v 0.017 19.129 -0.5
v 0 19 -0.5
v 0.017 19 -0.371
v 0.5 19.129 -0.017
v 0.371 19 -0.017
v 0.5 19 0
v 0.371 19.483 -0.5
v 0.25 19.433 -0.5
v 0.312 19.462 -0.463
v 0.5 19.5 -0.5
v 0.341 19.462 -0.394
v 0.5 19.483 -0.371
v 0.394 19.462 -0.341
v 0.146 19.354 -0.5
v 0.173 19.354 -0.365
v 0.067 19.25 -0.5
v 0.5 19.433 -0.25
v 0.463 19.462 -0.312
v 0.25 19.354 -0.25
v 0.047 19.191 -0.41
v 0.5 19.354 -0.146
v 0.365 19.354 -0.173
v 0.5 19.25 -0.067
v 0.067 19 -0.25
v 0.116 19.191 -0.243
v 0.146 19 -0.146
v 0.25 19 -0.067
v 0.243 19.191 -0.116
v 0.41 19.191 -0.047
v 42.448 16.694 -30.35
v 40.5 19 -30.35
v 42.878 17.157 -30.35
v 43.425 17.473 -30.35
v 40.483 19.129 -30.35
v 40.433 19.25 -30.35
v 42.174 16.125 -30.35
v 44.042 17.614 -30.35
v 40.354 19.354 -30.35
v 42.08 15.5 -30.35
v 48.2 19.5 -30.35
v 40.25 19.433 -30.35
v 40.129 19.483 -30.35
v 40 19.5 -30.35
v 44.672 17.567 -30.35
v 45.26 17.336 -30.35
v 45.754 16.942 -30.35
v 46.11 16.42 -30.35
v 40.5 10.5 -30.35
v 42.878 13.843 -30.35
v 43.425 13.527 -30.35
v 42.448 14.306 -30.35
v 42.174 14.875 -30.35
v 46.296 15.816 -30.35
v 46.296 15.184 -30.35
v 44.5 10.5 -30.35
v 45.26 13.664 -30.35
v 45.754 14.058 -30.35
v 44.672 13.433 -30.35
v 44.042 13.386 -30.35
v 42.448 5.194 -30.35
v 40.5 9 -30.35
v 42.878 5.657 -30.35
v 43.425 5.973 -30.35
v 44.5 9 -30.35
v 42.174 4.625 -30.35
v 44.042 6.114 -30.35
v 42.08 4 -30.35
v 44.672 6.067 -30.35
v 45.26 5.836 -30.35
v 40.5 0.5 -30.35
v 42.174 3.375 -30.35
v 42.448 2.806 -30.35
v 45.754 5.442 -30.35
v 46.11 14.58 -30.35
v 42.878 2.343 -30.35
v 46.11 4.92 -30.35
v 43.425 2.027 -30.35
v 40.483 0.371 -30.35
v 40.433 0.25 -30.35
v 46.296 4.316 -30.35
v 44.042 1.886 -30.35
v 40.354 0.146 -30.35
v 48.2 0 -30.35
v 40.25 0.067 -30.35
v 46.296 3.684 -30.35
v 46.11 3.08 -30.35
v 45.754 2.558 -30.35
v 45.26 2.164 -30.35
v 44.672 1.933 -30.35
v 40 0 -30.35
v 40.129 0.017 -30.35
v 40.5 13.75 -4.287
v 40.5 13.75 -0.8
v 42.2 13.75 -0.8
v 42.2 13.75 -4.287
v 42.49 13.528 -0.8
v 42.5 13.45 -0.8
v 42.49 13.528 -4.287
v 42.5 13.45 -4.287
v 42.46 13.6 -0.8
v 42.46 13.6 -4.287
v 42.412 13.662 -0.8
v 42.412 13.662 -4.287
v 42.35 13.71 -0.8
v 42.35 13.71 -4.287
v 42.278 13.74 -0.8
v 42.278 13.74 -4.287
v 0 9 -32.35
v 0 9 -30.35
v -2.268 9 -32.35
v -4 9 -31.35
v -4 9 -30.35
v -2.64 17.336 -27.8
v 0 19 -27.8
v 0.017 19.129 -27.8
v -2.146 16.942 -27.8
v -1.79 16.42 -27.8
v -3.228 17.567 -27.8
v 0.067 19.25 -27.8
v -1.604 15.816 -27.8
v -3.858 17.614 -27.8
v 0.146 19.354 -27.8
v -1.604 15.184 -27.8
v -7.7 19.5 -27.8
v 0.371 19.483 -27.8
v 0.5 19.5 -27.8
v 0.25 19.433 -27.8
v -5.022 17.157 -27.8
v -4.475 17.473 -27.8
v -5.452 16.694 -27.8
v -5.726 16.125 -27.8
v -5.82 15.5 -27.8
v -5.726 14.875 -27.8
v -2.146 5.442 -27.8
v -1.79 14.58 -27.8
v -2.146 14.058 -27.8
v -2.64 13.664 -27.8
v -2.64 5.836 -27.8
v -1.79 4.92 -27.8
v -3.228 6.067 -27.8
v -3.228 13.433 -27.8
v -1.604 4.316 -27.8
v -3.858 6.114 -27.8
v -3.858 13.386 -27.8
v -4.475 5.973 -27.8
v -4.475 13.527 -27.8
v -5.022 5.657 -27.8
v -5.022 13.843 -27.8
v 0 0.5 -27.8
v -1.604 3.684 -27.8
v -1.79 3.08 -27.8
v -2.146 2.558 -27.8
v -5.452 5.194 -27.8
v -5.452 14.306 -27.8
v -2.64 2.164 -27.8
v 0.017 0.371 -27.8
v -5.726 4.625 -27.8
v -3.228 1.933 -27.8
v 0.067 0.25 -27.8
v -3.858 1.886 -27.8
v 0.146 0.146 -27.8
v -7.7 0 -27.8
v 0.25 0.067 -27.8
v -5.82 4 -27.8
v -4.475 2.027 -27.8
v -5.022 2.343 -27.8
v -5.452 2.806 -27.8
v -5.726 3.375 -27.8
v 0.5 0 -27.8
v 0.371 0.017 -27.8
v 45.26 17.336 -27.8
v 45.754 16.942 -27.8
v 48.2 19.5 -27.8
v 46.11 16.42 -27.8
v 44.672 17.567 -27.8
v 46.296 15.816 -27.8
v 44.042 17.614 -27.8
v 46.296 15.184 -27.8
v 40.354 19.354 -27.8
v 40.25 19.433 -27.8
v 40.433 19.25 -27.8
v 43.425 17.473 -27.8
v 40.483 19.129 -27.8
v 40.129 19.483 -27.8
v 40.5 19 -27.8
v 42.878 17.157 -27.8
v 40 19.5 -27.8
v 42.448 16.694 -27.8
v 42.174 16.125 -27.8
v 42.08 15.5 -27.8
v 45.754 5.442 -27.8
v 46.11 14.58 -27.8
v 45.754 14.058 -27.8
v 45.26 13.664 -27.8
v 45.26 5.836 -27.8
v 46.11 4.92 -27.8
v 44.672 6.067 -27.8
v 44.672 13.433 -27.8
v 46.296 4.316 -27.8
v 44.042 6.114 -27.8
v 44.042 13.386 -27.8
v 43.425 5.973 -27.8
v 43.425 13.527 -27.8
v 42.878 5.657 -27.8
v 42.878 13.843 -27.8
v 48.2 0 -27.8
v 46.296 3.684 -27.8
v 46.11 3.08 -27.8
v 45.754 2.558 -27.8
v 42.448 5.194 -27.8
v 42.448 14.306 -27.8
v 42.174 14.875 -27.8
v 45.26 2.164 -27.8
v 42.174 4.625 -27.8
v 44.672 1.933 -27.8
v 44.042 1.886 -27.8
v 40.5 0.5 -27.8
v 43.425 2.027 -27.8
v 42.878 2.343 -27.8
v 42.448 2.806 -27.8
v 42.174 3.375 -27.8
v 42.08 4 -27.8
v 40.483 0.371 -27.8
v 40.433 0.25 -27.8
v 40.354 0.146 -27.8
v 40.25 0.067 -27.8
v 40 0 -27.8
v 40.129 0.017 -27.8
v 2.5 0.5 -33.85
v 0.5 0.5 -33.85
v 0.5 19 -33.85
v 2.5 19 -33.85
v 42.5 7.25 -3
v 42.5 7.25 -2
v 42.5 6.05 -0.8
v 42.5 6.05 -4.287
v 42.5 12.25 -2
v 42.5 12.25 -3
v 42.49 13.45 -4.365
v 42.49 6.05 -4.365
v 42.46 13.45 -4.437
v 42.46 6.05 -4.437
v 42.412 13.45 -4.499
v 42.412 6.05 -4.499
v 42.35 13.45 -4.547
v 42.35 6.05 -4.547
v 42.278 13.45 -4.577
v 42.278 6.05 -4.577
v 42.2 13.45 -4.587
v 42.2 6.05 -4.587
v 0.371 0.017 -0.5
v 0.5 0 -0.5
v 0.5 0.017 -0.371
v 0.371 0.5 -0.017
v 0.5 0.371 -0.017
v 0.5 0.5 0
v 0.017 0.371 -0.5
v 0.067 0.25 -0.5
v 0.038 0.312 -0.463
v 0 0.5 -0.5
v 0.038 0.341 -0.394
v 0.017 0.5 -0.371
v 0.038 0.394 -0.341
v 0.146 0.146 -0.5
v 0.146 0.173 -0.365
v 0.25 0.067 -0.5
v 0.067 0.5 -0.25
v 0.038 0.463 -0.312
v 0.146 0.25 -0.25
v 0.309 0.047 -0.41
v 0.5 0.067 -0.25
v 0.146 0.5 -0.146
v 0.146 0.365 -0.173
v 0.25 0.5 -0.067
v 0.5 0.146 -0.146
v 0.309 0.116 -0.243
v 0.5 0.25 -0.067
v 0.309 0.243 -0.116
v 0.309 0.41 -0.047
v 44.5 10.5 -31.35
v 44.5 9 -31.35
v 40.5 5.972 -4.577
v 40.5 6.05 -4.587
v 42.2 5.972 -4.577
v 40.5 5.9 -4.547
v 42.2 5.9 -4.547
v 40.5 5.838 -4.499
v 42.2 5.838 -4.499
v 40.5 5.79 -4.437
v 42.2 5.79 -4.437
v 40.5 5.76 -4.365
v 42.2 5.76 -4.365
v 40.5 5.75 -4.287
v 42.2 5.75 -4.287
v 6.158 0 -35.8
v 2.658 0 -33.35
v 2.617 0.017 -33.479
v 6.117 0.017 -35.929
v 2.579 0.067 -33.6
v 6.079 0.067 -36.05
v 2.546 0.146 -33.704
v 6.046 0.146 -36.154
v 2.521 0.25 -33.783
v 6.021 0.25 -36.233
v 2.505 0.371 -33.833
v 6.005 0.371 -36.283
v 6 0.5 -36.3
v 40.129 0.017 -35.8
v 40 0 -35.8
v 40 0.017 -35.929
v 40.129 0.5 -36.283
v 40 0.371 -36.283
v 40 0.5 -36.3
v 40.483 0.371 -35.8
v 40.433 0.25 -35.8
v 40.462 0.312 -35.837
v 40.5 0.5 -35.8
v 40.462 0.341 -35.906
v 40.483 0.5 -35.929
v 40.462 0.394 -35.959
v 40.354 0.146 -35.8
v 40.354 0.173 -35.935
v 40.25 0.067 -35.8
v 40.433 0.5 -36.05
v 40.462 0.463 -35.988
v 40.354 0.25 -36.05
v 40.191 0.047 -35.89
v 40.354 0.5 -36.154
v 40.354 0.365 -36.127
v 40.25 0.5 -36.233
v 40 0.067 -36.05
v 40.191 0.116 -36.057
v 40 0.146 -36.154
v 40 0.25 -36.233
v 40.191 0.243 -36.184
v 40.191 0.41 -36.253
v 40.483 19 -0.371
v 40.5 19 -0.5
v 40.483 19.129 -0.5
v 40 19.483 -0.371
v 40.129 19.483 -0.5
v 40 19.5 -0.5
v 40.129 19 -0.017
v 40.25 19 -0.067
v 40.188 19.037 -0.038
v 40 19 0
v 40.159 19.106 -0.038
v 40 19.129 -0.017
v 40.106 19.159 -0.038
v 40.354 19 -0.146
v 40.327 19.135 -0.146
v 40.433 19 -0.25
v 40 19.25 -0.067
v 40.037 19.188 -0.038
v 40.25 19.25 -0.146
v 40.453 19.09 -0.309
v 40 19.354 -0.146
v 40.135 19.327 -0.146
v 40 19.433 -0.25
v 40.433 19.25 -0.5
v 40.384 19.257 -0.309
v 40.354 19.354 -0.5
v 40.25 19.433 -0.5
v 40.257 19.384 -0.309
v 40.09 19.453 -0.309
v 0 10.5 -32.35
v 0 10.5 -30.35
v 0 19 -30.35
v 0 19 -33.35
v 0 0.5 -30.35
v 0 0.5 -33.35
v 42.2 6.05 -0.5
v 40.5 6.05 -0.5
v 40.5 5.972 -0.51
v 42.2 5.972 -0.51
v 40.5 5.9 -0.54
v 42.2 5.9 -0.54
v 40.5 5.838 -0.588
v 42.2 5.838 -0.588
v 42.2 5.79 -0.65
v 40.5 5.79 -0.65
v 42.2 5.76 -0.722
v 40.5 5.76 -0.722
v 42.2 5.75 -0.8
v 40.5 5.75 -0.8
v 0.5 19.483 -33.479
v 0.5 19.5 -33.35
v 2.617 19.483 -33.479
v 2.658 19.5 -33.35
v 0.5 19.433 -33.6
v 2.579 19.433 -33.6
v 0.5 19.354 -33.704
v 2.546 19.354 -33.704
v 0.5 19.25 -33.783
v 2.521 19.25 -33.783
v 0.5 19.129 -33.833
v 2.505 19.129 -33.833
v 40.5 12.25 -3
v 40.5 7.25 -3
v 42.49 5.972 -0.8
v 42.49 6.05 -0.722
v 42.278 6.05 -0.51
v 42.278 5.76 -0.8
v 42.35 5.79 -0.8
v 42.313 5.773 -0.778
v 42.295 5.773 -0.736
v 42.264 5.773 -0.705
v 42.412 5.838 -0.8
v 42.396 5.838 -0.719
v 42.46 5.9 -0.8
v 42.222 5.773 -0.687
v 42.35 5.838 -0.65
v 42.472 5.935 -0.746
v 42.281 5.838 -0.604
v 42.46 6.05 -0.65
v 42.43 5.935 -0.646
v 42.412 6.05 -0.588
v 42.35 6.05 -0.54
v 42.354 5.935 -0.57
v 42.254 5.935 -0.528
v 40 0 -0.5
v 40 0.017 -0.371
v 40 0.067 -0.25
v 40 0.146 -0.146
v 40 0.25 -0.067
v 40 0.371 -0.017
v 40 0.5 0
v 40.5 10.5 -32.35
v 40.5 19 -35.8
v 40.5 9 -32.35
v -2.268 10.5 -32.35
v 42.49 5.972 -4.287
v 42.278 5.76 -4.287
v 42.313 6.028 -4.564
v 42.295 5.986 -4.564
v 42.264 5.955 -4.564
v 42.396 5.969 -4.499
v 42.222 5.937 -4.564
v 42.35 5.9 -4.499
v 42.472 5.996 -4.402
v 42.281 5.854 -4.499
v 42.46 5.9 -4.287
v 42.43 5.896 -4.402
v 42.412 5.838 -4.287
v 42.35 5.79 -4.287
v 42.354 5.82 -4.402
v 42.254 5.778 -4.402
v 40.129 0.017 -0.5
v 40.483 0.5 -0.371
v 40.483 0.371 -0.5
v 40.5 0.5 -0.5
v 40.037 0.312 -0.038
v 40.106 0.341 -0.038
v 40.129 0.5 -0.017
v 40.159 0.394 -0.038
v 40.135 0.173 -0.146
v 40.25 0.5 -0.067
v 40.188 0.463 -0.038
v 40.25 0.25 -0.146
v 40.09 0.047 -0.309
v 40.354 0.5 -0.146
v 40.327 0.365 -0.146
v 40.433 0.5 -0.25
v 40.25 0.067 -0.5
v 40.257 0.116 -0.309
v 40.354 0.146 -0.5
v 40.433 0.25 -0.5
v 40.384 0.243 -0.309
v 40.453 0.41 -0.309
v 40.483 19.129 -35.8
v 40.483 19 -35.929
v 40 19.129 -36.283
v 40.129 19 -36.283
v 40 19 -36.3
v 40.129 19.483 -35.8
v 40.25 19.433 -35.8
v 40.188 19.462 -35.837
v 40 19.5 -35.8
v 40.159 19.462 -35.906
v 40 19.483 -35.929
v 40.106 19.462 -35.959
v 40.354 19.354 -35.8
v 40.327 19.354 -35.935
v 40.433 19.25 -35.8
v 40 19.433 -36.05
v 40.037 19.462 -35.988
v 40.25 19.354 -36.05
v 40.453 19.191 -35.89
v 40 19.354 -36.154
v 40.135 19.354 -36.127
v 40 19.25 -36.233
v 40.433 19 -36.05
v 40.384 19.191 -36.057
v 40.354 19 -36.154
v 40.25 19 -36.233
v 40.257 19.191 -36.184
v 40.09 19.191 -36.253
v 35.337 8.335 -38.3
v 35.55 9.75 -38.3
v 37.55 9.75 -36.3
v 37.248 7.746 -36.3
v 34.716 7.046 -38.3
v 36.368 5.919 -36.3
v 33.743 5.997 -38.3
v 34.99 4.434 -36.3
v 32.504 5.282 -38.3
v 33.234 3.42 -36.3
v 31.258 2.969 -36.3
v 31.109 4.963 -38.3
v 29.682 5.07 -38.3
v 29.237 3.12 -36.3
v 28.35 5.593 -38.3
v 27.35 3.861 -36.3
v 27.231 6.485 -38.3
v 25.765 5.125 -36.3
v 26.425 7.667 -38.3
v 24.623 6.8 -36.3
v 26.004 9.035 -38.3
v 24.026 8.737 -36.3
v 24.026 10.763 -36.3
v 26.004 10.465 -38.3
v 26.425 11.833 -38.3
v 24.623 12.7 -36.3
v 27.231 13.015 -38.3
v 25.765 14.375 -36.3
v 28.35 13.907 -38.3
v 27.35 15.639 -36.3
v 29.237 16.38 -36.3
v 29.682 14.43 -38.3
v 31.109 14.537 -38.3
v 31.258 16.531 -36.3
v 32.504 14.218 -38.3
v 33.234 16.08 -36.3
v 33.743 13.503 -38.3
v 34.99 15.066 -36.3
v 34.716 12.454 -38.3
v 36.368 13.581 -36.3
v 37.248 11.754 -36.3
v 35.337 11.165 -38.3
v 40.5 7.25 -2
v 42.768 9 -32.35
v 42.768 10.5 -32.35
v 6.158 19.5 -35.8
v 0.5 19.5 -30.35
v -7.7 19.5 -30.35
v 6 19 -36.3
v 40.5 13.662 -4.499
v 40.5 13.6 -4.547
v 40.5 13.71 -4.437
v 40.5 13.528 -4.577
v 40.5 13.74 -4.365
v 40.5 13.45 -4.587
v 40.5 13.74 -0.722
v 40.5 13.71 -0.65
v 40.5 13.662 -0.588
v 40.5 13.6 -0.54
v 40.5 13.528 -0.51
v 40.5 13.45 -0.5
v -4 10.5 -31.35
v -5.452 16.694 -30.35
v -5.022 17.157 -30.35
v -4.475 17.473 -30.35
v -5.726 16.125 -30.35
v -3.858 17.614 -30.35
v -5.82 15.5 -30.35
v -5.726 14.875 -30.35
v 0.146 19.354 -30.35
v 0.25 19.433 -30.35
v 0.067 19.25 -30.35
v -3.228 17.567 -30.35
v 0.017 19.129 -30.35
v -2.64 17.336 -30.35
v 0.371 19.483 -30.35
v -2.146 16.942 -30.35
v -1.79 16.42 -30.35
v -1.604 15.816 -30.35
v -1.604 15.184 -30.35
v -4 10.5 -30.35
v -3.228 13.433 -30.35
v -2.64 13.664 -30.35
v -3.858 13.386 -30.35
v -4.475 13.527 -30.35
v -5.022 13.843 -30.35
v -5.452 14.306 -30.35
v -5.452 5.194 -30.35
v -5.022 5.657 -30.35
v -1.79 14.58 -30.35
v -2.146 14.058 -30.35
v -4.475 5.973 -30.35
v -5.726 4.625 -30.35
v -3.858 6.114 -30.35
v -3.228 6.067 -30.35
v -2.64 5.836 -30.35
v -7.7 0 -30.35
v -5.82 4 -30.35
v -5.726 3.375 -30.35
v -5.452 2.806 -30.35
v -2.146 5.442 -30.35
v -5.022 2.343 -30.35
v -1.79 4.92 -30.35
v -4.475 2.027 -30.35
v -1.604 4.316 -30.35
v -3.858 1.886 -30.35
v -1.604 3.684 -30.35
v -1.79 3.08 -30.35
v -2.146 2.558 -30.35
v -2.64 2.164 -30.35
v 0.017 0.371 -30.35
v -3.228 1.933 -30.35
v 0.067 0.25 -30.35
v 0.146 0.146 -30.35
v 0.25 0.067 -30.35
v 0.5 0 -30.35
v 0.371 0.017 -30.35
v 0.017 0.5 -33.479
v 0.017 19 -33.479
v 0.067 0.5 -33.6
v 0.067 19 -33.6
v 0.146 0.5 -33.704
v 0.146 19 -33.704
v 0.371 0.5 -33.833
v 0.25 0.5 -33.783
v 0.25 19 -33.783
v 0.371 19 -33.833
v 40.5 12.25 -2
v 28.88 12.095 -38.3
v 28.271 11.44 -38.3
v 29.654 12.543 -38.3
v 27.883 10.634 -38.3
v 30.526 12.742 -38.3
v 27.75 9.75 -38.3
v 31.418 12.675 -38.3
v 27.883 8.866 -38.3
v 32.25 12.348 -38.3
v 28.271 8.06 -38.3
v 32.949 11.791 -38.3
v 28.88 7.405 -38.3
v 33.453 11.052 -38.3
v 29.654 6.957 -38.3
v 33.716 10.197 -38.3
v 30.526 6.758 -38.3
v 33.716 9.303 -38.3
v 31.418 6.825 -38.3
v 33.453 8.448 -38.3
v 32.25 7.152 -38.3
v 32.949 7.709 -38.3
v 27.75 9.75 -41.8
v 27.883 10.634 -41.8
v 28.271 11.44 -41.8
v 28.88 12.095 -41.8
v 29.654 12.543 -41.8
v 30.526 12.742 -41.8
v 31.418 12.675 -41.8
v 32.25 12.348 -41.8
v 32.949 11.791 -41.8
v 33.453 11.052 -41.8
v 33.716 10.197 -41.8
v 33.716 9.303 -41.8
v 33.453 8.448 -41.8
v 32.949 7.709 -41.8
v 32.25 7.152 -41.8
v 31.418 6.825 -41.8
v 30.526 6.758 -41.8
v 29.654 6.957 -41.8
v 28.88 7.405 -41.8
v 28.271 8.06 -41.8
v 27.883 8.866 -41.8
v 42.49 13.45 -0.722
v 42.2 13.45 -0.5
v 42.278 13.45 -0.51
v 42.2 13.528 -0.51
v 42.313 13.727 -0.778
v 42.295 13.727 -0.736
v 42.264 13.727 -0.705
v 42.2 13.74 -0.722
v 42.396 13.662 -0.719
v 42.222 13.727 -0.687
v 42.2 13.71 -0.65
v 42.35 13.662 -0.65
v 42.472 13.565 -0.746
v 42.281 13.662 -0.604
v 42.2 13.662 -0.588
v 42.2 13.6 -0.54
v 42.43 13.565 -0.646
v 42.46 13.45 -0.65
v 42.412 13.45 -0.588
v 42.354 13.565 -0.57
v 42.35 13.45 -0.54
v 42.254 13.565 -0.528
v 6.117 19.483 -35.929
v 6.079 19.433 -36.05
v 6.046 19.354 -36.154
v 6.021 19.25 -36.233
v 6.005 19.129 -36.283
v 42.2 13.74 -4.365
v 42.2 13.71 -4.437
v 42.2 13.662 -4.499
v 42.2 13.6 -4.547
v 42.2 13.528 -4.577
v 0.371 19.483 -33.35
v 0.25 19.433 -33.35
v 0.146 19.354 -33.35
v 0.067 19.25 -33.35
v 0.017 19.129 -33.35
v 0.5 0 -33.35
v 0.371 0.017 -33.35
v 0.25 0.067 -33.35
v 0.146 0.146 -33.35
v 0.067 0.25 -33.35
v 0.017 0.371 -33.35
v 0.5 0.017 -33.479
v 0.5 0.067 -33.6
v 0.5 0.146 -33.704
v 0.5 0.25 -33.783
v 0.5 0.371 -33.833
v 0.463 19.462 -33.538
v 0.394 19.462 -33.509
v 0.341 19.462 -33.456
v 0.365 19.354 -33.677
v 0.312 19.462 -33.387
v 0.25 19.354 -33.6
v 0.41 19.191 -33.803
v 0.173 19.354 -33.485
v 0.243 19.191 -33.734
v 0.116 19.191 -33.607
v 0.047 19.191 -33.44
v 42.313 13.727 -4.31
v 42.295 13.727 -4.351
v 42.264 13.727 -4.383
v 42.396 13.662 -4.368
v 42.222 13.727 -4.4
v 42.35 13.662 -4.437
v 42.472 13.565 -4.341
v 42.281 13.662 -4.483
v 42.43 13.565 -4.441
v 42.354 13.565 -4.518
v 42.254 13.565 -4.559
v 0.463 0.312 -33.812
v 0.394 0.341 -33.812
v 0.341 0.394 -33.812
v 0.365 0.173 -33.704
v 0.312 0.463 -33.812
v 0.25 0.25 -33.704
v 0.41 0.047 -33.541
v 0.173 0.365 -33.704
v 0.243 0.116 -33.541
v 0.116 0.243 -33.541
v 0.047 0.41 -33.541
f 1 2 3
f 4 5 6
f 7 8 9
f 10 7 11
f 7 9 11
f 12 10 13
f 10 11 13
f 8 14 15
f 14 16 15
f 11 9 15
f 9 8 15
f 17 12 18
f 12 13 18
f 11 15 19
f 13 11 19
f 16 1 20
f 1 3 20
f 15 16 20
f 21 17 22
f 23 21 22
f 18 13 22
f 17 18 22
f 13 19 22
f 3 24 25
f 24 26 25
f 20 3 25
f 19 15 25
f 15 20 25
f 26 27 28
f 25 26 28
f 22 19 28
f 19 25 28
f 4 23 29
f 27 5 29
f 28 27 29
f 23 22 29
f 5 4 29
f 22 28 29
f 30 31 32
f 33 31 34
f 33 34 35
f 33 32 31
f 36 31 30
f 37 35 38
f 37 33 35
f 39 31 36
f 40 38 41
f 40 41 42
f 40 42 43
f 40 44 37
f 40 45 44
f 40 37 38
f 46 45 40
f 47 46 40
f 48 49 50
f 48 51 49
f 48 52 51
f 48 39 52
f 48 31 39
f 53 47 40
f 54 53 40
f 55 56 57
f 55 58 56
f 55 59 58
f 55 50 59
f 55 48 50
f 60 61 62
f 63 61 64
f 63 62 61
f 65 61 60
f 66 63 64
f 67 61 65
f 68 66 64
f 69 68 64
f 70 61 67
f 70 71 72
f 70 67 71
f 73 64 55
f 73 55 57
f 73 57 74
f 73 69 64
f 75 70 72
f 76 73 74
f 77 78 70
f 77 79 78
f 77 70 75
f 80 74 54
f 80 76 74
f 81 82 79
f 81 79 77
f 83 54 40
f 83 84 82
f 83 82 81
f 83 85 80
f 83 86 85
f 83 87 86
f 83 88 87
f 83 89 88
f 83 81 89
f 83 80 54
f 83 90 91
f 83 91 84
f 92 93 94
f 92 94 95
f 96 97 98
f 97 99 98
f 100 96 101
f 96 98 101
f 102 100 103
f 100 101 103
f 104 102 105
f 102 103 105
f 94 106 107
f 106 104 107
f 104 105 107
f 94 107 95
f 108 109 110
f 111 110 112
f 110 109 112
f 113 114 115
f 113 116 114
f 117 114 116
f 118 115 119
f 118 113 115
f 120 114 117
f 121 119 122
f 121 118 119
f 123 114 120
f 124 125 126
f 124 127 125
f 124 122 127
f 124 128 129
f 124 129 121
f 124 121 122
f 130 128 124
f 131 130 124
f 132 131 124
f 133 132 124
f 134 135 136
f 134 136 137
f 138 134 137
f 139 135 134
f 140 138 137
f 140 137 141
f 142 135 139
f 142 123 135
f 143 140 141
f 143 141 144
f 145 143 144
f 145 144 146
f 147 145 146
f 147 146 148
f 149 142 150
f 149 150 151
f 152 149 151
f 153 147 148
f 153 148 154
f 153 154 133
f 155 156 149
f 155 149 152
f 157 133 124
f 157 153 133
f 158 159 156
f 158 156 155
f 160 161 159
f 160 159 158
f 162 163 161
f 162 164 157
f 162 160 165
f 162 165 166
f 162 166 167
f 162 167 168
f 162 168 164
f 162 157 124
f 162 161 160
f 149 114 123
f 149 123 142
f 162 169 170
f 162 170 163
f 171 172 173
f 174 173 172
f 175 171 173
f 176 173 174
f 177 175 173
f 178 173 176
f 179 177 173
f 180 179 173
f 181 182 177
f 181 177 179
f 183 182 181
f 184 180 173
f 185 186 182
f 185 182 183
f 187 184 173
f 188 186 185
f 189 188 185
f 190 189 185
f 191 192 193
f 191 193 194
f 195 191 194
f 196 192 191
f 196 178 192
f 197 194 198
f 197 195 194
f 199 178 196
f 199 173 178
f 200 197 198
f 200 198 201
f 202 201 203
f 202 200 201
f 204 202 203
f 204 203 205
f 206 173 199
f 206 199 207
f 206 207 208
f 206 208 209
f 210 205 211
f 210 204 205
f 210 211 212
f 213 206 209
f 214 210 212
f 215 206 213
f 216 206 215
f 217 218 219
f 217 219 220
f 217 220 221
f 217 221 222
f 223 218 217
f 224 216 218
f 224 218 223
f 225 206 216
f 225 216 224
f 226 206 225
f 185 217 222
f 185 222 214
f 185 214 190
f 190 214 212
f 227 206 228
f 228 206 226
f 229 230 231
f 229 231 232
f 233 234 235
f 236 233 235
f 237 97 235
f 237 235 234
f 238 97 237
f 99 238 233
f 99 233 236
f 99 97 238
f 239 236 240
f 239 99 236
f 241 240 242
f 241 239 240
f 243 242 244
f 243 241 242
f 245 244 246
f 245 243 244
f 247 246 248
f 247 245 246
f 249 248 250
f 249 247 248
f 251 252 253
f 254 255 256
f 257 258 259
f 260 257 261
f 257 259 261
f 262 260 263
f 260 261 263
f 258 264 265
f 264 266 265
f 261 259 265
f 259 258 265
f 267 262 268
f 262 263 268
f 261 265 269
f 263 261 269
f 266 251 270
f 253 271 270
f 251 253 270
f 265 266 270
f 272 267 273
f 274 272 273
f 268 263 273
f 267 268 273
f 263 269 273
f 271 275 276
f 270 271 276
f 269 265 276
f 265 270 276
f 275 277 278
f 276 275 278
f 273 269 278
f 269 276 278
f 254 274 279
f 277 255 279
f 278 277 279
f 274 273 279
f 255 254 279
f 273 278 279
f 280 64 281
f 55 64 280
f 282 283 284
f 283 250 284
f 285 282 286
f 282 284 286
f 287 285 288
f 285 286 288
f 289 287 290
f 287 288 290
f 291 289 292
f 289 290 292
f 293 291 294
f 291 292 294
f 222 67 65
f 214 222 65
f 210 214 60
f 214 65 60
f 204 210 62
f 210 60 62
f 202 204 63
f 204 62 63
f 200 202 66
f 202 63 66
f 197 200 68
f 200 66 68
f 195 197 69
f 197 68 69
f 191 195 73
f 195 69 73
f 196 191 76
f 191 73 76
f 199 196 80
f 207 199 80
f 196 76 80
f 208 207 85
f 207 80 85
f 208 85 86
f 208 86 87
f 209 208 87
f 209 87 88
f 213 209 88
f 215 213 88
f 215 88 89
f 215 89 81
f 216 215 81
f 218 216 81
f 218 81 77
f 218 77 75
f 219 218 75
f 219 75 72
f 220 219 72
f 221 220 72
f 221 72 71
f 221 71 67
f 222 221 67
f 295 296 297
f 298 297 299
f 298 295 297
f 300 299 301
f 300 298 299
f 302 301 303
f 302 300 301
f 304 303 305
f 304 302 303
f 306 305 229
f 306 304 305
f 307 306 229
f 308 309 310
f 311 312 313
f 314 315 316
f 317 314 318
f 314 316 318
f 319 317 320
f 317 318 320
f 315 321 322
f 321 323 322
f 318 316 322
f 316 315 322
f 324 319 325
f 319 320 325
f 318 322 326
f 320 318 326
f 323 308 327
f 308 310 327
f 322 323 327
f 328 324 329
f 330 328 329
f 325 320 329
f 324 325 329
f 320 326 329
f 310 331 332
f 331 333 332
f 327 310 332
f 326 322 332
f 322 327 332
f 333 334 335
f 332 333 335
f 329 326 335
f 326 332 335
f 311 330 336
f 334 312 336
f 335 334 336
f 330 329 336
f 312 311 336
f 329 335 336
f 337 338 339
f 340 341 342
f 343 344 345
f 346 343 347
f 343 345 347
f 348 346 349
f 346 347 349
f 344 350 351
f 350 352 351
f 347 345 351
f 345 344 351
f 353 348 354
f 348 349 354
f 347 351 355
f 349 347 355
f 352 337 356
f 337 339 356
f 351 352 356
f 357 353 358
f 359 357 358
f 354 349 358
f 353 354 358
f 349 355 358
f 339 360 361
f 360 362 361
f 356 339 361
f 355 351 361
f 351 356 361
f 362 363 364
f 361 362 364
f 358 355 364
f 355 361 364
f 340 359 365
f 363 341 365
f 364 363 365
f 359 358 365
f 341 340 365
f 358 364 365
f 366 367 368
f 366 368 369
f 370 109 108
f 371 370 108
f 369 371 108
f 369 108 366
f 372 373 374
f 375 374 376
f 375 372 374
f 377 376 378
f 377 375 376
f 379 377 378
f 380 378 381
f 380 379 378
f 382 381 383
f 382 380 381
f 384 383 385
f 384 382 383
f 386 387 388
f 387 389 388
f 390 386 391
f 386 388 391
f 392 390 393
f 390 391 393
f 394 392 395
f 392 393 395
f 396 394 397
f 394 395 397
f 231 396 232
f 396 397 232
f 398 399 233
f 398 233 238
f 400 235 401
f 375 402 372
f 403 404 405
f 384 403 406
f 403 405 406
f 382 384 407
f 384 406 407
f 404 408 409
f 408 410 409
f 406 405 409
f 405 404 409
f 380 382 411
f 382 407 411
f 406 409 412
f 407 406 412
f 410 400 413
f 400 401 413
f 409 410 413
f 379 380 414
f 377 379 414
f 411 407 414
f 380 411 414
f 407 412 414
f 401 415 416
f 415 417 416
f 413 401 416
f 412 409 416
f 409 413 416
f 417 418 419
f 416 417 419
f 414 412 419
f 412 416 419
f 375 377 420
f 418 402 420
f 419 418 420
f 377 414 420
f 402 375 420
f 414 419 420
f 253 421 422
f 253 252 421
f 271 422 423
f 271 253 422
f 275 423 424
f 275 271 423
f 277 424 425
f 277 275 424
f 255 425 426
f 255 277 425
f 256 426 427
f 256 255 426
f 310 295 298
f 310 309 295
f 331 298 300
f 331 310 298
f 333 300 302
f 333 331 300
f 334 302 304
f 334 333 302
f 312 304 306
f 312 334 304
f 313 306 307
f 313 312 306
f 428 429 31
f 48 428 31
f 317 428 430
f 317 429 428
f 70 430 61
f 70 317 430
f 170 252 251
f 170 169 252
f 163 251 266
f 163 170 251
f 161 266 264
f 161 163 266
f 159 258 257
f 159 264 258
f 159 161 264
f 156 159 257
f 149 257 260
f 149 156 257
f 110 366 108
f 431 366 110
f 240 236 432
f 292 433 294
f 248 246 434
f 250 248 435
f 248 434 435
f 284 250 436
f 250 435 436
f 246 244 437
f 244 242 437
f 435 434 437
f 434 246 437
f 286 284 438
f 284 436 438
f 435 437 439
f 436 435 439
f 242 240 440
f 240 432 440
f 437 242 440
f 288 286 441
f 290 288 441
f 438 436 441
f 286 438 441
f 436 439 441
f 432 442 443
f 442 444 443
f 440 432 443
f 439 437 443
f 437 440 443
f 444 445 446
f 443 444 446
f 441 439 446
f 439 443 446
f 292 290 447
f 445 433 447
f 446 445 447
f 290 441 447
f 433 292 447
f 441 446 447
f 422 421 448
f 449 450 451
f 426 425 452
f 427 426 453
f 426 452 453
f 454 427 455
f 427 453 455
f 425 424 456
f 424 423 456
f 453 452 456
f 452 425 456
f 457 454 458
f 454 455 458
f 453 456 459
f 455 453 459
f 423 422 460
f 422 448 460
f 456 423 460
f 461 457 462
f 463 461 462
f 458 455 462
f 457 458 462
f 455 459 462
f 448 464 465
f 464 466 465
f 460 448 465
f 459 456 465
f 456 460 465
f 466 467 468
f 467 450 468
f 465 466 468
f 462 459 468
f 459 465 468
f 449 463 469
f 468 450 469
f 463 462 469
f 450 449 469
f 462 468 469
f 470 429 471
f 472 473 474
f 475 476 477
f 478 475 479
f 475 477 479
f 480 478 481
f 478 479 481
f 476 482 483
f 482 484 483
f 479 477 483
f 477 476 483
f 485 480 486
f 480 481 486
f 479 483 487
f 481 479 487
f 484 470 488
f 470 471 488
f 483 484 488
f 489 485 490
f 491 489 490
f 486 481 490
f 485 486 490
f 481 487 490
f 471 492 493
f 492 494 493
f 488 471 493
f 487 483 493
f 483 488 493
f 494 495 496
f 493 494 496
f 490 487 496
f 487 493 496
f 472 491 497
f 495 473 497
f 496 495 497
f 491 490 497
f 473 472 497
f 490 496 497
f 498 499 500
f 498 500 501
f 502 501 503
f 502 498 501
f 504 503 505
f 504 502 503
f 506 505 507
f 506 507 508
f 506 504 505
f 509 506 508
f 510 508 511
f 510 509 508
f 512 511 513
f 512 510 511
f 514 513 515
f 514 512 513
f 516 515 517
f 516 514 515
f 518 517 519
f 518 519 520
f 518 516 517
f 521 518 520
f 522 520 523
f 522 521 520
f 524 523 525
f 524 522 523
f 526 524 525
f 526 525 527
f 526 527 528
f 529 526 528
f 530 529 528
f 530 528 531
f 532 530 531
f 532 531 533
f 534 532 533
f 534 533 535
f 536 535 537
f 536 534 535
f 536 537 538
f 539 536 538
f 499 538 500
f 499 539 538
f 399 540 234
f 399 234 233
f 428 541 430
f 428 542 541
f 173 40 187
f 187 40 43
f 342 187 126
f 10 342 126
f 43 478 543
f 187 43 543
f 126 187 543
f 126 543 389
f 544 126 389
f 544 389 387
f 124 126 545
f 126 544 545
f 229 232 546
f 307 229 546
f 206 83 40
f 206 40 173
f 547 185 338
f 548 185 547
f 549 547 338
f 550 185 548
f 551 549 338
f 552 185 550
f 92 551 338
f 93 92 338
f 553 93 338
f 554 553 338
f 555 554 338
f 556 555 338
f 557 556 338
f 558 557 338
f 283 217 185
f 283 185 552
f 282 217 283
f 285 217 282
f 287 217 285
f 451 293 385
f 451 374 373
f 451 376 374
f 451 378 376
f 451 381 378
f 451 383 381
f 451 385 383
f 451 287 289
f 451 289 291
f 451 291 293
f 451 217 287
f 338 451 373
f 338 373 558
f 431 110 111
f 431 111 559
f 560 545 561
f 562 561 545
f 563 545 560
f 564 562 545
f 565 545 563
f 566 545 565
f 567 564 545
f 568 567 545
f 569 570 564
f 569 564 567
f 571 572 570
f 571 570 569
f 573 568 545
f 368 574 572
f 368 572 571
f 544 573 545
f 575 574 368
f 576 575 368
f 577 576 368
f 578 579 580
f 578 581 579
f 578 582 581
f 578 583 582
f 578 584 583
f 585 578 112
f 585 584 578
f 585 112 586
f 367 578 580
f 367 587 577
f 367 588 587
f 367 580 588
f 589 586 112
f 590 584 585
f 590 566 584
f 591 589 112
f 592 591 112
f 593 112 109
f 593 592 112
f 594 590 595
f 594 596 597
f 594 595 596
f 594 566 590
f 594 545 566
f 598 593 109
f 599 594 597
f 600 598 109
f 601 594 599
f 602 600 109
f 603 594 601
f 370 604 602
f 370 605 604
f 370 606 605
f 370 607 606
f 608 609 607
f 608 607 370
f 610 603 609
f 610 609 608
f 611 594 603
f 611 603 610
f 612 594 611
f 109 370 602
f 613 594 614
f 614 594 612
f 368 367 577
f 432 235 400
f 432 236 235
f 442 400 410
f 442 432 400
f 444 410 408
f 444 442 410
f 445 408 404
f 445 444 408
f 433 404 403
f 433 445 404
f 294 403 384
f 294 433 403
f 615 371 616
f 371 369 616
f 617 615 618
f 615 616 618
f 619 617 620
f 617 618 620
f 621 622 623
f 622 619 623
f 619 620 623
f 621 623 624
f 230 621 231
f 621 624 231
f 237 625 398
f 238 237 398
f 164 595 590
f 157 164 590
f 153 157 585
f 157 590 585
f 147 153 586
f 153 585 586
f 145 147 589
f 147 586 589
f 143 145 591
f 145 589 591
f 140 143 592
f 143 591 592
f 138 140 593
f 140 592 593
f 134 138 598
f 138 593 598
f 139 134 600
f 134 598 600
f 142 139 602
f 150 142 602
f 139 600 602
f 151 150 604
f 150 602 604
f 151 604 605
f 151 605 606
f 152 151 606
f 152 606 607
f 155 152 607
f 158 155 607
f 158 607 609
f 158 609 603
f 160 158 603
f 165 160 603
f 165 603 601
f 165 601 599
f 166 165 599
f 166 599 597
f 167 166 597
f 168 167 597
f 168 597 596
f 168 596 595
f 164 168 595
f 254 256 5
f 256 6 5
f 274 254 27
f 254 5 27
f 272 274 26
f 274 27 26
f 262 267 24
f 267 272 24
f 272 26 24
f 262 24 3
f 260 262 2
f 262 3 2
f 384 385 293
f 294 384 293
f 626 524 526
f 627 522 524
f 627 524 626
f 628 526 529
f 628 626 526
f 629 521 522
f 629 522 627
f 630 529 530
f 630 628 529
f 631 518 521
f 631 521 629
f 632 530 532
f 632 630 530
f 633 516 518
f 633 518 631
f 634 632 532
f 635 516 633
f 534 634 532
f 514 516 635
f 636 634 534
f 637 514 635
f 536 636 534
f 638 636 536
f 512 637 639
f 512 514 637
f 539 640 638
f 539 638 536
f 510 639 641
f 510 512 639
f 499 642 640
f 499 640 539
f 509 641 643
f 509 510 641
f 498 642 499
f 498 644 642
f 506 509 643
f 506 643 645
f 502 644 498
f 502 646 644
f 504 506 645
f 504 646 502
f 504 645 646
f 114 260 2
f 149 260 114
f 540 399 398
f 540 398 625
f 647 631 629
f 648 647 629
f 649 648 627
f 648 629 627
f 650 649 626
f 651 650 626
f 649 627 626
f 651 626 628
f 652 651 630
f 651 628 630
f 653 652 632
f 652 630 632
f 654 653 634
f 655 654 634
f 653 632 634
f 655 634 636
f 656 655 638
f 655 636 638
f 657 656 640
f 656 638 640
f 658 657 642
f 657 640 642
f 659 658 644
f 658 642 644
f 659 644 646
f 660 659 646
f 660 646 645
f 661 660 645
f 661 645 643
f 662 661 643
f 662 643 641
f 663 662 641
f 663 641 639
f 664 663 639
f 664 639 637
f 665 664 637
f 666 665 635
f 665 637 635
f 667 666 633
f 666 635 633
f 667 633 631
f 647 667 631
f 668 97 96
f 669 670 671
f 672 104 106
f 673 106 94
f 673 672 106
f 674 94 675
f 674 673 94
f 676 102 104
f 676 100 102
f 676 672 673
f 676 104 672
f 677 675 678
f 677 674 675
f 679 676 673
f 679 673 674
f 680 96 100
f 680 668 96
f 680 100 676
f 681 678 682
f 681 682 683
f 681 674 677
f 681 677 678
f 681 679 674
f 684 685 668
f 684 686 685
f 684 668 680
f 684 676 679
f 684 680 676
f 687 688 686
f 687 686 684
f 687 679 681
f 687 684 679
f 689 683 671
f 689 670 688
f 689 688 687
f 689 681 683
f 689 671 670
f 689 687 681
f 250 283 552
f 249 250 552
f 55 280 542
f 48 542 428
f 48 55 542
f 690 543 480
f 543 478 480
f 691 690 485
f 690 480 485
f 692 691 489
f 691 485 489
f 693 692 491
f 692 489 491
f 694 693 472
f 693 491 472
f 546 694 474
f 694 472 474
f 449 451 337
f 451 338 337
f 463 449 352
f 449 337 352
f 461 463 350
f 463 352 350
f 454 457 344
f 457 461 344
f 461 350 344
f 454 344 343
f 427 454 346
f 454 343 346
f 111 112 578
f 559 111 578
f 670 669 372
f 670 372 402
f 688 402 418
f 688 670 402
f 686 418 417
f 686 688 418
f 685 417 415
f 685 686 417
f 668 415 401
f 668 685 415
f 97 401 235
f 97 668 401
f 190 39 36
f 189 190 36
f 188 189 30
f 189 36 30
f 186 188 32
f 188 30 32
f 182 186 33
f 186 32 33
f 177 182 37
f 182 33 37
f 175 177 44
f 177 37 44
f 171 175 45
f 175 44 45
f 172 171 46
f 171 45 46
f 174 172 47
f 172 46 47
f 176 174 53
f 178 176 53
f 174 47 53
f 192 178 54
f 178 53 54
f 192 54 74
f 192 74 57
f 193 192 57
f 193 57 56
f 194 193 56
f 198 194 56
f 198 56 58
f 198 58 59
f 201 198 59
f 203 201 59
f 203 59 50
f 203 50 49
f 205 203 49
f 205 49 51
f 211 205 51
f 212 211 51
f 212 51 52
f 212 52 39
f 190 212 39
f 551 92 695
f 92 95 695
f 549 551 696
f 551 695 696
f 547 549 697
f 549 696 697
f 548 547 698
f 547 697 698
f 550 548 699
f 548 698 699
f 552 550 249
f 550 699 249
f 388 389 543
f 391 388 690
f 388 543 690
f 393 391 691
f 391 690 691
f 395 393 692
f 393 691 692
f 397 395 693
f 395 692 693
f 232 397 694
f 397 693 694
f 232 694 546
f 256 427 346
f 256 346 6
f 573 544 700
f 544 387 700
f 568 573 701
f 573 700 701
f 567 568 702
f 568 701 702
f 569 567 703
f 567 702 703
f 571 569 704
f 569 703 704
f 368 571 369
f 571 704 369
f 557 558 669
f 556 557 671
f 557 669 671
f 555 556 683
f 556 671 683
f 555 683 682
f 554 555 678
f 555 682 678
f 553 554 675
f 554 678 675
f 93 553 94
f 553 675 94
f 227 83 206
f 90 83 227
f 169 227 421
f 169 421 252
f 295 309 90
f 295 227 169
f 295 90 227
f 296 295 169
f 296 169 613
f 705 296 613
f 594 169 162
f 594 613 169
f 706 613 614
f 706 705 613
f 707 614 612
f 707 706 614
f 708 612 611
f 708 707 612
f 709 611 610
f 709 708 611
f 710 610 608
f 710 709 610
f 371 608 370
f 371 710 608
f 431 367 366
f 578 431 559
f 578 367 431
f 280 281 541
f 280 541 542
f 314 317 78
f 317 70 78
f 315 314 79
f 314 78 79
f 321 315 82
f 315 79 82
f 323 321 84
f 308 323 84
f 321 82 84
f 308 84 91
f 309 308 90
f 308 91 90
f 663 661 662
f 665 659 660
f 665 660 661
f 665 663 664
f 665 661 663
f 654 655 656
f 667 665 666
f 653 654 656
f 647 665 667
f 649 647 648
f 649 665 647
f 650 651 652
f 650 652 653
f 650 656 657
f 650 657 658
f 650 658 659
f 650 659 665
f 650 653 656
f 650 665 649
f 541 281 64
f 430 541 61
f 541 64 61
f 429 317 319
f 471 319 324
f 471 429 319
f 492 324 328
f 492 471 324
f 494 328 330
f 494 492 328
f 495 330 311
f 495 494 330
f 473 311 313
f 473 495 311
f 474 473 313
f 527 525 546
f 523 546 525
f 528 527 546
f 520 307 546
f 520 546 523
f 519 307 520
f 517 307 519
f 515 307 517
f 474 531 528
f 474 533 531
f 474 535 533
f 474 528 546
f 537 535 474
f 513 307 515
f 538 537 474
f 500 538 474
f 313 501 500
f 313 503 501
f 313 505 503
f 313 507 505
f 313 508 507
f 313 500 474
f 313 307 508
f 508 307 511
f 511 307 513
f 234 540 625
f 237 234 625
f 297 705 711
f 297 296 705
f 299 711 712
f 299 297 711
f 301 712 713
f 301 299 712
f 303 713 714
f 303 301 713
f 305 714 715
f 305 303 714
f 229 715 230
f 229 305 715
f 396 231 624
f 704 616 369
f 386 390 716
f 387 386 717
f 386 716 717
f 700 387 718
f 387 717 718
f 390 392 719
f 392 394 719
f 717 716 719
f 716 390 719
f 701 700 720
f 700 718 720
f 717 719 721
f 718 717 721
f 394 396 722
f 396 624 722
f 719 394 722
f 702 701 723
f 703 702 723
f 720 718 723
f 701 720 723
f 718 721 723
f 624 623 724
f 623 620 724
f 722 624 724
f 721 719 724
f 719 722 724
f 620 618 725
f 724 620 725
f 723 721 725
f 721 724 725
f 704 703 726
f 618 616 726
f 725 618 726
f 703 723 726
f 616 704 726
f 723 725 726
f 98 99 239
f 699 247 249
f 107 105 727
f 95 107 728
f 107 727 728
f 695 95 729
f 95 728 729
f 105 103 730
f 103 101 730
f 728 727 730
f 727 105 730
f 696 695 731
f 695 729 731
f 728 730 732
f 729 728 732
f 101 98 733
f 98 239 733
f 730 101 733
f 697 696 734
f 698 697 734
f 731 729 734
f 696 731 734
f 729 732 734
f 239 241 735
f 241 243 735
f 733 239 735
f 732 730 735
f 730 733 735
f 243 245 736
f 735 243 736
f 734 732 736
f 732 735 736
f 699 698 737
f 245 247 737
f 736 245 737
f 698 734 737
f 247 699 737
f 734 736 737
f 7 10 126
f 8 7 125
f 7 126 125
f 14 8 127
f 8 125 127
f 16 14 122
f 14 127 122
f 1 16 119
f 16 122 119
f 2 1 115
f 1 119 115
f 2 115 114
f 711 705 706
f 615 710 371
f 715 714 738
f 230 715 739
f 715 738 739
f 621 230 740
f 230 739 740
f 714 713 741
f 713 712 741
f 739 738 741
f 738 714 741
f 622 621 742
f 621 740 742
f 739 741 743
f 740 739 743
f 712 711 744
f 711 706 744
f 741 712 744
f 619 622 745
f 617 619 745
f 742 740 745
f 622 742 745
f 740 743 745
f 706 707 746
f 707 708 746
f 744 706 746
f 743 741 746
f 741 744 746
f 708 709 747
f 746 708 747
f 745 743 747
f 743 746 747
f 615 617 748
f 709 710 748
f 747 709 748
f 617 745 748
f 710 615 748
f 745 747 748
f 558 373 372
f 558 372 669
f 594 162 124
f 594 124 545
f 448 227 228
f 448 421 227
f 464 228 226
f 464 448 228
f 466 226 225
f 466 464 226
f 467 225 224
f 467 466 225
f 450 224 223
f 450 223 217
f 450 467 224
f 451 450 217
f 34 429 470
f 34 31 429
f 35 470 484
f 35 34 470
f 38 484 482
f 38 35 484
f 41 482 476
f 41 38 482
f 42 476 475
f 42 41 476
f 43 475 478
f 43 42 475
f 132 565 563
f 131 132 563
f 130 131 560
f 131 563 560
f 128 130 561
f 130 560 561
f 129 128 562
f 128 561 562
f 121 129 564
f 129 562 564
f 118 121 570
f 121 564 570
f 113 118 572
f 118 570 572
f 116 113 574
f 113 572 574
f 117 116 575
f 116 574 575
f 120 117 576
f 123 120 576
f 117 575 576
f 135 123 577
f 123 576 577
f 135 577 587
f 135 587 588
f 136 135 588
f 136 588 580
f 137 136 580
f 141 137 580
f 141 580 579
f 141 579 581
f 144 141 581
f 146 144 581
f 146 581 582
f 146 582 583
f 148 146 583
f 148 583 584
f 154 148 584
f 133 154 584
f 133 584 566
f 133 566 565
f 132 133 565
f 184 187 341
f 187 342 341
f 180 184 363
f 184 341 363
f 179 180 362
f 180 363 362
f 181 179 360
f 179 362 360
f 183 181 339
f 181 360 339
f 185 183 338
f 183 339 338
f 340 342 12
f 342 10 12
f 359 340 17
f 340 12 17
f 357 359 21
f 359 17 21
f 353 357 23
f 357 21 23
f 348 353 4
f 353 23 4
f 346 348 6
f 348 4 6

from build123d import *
from OCP.BRepFilletAPI import BRepFilletAPI_MakeChamfer

# Parameters (mm, degrees)
EXTRUSION1_DEPTH        = 19.5
ESQUISSE3_R             = 2.12
ENL_V_MAT_EXTRU_1_DEPTH = 61.204754796
ESQUISSE4_R             = 6.8
EXTRUSION2_DEPTH        = 2
ESQUISSE5_R             = 3
EXTRUSION3_DEPTH        = 3.5
CHANFREIN1_SIZE         = 2
ESQUISSE6_W             = 4
ESQUISSE6_H             = 1.5
EXTRUSION4_DEPTH        = 2
CHANFREIN2_SIZE         = 1
CHANFREIN2_SIZE2        = 1.732050808
ESQUISSE8_W             = 4.087218226
ESQUISSE8_H             = 8
ESQUISSE8_W_2           = 1
ESQUISSE8_H_2           = 5
EXTRUSION5_DEPTH        = 2
CONG_2_R                = 0.5
CONG_3_R                = 0.3


with BuildPart() as part:
    # Esquisse1 → Extrusion1 (new body)
    with BuildSketch(Plane(origin=(0, 0, 0), x_dir=(1, 0, 0), z_dir=(0, 1, 0))):
        Polygon((0, 27.8), (-7.7, 27.8), (-7.7, 30.35), (0, 30.35), (0, 33.85), (2.5, 33.85), (6, 36.3), (40.5, 36.3), (40.5, 30.35), (48.2, 30.35), (48.2, 27.8), (40.5, 27.8), (40.5, 0), (0, 0), align=None)
    extrude(amount=EXTRUSION1_DEPTH)

    # Esquisse3 → Enlèv. mat.-Extru.1 (cut, through all)
    with BuildSketch(Plane(origin=(0, 0, -30.35), x_dir=(-1, 0, 0), z_dir=(0, 0, -1))):
        with Locations((3.7, 4)):
            Circle(ESQUISSE3_R)
        with Locations((3.7, 15.5)):
            Circle(ESQUISSE3_R)
        with Locations((-44.2, 15.5)):
            Circle(ESQUISSE3_R)
        with Locations((-44.2, 4)):
            Circle(ESQUISSE3_R)
    extrude(amount=-ENL_V_MAT_EXTRU_1_DEPTH, mode=Mode.SUBTRACT)

    # Esquisse4 → Extrusion2 (add)
    with BuildSketch(Plane(origin=(0, 0, -36.3), x_dir=(-1, 0, 0), z_dir=(0, 0, -1))):
        with Locations(Location((-30.75, 9.75, 0), (0, 0, 180))):
            Circle(ESQUISSE4_R)
    extrude(amount=EXTRUSION2_DEPTH)

    # Esquisse5 → Extrusion3 (add)
    with BuildSketch(Plane(origin=(0, 0, -38.3), x_dir=(-1, 0, 0), z_dir=(0, 0, -1))):
        with Locations((-30.75, 9.75)):
            Circle(ESQUISSE5_R)
    extrude(amount=EXTRUSION3_DEPTH)

    # Chanfrein1
    chanfrein1_edges = [part.edges().sort_by_distance(p)[0] for p in [
        (23.95, 9.75, -38.3),
    ]]
    chamfer(chanfrein1_edges, length=CHANFREIN1_SIZE - 0.0001)  # a hair under: the kernel refuses the full size

    # Esquisse6 → Extrusion4 (add)
    with BuildSketch(Plane(origin=(0, 0, -30.35), x_dir=(-1, 0, 0), z_dir=(0, 0, -1))):
        with Locations((-42.5, 9.75)):
            Rectangle(ESQUISSE6_W, ESQUISSE6_H)
        with Locations((2, 9.75)):
            Rectangle(ESQUISSE6_W, ESQUISSE6_H)
    extrude(amount=EXTRUSION4_DEPTH)

    # Chanfrein2: one chamfer whose edges measure the first distance from different faces: ONE call of the kernel's chamfer builder (chamfer() names one face for all edges)
    chanfrein2_edges_1 = [part.edges().sort_by_distance(p)[0] for p in [
        (-4, 9.75, -32.35),
    ]]
    chanfrein2_side_1 = [part.faces().sort_by_distance(p)[0] for p in [
        (-4, 9.75, -31.35),
    ]]
    chanfrein2_edges_2 = [part.edges().sort_by_distance(p)[0] for p in [
        (44.5, 9.75, -32.35),
    ]]
    chanfrein2_side_2 = [part.faces().sort_by_distance(p)[0] for p in [
        (44.5, 9.75, -31.35),
    ]]
    chanfrein2 = BRepFilletAPI_MakeChamfer(part.part.solid().wrapped)
    for e in chanfrein2_edges_1:
        chanfrein2.Add(CHANFREIN2_SIZE, CHANFREIN2_SIZE2, e.wrapped, chanfrein2_side_1[0].wrapped)  # the first distance lies on this face
    for e in chanfrein2_edges_2:
        chanfrein2.Add(CHANFREIN2_SIZE, CHANFREIN2_SIZE2, e.wrapped, chanfrein2_side_2[0].wrapped)  # the first distance lies on this face
    add(Compound.cast(chanfrein2.Shape()), mode=Mode.REPLACE)

    # Esquisse8 → Extrusion5 (add)
    with BuildSketch(Plane(origin=(40.5, 0, 0), x_dir=(0, 0, -1), z_dir=(1, 0, 0))):
        with Locations((2.543609113, 9.75)):
            Rectangle(ESQUISSE8_W, ESQUISSE8_H)
        with Locations((2.5, 9.75)):
            Rectangle(ESQUISSE8_W_2, ESQUISSE8_H_2, mode=Mode.SUBTRACT)
    extrude(amount=EXTRUSION5_DEPTH)

    # Congé2
    cong_2_edges = [part.edges().sort_by_distance(p)[0] for p in [
        (40.5, 19.5, -13.9),
        (0, 0, -32.1),
        (1.25, 0, -33.85),
        (4.25, 0, -35.075),
        (23.25, 0, -36.3),
        (40.5, 0, -33.325),
        (40.5, 0, -13.9),
        (20.25, 0, 0),
        (0, 0, -13.9),
        (0, 9.75, -33.85),
        (40.5, 9.75, -36.3),
        (40.5, 19.5, -33.325),
        (40.5, 9.75, 0),
        (0, 9.75, 0),
        (23.25, 19.5, -36.3),
        (4.25, 19.5, -35.075),
        (1.25, 19.5, -33.85),
        (0, 19.5, -32.1),
        (0, 19.5, -13.9),
        (20.25, 19.5, 0),
    ]]
    fillet(cong_2_edges, radius=CONG_2_R - 0.0001)  # a hair under: the kernel refuses the full size

    # Congé3
    cong_3_edges = [part.edges().sort_by_distance(p)[0] for p in [
        (42.5, 9.75, -0.5),
        (42.5, 5.75, -2.543609113),
        (42.5, 9.75, -4.587218226),
        (42.5, 13.75, -2.543609113),
        (41.5, 13.75, -0.5),
        (41.5, 5.75, -0.5),
        (41.5, 5.75, -4.587218226),
        (41.5, 13.75, -4.587218226),
    ]]
    fillet(cong_3_edges, radius=CONG_3_R)


solid = part.part
